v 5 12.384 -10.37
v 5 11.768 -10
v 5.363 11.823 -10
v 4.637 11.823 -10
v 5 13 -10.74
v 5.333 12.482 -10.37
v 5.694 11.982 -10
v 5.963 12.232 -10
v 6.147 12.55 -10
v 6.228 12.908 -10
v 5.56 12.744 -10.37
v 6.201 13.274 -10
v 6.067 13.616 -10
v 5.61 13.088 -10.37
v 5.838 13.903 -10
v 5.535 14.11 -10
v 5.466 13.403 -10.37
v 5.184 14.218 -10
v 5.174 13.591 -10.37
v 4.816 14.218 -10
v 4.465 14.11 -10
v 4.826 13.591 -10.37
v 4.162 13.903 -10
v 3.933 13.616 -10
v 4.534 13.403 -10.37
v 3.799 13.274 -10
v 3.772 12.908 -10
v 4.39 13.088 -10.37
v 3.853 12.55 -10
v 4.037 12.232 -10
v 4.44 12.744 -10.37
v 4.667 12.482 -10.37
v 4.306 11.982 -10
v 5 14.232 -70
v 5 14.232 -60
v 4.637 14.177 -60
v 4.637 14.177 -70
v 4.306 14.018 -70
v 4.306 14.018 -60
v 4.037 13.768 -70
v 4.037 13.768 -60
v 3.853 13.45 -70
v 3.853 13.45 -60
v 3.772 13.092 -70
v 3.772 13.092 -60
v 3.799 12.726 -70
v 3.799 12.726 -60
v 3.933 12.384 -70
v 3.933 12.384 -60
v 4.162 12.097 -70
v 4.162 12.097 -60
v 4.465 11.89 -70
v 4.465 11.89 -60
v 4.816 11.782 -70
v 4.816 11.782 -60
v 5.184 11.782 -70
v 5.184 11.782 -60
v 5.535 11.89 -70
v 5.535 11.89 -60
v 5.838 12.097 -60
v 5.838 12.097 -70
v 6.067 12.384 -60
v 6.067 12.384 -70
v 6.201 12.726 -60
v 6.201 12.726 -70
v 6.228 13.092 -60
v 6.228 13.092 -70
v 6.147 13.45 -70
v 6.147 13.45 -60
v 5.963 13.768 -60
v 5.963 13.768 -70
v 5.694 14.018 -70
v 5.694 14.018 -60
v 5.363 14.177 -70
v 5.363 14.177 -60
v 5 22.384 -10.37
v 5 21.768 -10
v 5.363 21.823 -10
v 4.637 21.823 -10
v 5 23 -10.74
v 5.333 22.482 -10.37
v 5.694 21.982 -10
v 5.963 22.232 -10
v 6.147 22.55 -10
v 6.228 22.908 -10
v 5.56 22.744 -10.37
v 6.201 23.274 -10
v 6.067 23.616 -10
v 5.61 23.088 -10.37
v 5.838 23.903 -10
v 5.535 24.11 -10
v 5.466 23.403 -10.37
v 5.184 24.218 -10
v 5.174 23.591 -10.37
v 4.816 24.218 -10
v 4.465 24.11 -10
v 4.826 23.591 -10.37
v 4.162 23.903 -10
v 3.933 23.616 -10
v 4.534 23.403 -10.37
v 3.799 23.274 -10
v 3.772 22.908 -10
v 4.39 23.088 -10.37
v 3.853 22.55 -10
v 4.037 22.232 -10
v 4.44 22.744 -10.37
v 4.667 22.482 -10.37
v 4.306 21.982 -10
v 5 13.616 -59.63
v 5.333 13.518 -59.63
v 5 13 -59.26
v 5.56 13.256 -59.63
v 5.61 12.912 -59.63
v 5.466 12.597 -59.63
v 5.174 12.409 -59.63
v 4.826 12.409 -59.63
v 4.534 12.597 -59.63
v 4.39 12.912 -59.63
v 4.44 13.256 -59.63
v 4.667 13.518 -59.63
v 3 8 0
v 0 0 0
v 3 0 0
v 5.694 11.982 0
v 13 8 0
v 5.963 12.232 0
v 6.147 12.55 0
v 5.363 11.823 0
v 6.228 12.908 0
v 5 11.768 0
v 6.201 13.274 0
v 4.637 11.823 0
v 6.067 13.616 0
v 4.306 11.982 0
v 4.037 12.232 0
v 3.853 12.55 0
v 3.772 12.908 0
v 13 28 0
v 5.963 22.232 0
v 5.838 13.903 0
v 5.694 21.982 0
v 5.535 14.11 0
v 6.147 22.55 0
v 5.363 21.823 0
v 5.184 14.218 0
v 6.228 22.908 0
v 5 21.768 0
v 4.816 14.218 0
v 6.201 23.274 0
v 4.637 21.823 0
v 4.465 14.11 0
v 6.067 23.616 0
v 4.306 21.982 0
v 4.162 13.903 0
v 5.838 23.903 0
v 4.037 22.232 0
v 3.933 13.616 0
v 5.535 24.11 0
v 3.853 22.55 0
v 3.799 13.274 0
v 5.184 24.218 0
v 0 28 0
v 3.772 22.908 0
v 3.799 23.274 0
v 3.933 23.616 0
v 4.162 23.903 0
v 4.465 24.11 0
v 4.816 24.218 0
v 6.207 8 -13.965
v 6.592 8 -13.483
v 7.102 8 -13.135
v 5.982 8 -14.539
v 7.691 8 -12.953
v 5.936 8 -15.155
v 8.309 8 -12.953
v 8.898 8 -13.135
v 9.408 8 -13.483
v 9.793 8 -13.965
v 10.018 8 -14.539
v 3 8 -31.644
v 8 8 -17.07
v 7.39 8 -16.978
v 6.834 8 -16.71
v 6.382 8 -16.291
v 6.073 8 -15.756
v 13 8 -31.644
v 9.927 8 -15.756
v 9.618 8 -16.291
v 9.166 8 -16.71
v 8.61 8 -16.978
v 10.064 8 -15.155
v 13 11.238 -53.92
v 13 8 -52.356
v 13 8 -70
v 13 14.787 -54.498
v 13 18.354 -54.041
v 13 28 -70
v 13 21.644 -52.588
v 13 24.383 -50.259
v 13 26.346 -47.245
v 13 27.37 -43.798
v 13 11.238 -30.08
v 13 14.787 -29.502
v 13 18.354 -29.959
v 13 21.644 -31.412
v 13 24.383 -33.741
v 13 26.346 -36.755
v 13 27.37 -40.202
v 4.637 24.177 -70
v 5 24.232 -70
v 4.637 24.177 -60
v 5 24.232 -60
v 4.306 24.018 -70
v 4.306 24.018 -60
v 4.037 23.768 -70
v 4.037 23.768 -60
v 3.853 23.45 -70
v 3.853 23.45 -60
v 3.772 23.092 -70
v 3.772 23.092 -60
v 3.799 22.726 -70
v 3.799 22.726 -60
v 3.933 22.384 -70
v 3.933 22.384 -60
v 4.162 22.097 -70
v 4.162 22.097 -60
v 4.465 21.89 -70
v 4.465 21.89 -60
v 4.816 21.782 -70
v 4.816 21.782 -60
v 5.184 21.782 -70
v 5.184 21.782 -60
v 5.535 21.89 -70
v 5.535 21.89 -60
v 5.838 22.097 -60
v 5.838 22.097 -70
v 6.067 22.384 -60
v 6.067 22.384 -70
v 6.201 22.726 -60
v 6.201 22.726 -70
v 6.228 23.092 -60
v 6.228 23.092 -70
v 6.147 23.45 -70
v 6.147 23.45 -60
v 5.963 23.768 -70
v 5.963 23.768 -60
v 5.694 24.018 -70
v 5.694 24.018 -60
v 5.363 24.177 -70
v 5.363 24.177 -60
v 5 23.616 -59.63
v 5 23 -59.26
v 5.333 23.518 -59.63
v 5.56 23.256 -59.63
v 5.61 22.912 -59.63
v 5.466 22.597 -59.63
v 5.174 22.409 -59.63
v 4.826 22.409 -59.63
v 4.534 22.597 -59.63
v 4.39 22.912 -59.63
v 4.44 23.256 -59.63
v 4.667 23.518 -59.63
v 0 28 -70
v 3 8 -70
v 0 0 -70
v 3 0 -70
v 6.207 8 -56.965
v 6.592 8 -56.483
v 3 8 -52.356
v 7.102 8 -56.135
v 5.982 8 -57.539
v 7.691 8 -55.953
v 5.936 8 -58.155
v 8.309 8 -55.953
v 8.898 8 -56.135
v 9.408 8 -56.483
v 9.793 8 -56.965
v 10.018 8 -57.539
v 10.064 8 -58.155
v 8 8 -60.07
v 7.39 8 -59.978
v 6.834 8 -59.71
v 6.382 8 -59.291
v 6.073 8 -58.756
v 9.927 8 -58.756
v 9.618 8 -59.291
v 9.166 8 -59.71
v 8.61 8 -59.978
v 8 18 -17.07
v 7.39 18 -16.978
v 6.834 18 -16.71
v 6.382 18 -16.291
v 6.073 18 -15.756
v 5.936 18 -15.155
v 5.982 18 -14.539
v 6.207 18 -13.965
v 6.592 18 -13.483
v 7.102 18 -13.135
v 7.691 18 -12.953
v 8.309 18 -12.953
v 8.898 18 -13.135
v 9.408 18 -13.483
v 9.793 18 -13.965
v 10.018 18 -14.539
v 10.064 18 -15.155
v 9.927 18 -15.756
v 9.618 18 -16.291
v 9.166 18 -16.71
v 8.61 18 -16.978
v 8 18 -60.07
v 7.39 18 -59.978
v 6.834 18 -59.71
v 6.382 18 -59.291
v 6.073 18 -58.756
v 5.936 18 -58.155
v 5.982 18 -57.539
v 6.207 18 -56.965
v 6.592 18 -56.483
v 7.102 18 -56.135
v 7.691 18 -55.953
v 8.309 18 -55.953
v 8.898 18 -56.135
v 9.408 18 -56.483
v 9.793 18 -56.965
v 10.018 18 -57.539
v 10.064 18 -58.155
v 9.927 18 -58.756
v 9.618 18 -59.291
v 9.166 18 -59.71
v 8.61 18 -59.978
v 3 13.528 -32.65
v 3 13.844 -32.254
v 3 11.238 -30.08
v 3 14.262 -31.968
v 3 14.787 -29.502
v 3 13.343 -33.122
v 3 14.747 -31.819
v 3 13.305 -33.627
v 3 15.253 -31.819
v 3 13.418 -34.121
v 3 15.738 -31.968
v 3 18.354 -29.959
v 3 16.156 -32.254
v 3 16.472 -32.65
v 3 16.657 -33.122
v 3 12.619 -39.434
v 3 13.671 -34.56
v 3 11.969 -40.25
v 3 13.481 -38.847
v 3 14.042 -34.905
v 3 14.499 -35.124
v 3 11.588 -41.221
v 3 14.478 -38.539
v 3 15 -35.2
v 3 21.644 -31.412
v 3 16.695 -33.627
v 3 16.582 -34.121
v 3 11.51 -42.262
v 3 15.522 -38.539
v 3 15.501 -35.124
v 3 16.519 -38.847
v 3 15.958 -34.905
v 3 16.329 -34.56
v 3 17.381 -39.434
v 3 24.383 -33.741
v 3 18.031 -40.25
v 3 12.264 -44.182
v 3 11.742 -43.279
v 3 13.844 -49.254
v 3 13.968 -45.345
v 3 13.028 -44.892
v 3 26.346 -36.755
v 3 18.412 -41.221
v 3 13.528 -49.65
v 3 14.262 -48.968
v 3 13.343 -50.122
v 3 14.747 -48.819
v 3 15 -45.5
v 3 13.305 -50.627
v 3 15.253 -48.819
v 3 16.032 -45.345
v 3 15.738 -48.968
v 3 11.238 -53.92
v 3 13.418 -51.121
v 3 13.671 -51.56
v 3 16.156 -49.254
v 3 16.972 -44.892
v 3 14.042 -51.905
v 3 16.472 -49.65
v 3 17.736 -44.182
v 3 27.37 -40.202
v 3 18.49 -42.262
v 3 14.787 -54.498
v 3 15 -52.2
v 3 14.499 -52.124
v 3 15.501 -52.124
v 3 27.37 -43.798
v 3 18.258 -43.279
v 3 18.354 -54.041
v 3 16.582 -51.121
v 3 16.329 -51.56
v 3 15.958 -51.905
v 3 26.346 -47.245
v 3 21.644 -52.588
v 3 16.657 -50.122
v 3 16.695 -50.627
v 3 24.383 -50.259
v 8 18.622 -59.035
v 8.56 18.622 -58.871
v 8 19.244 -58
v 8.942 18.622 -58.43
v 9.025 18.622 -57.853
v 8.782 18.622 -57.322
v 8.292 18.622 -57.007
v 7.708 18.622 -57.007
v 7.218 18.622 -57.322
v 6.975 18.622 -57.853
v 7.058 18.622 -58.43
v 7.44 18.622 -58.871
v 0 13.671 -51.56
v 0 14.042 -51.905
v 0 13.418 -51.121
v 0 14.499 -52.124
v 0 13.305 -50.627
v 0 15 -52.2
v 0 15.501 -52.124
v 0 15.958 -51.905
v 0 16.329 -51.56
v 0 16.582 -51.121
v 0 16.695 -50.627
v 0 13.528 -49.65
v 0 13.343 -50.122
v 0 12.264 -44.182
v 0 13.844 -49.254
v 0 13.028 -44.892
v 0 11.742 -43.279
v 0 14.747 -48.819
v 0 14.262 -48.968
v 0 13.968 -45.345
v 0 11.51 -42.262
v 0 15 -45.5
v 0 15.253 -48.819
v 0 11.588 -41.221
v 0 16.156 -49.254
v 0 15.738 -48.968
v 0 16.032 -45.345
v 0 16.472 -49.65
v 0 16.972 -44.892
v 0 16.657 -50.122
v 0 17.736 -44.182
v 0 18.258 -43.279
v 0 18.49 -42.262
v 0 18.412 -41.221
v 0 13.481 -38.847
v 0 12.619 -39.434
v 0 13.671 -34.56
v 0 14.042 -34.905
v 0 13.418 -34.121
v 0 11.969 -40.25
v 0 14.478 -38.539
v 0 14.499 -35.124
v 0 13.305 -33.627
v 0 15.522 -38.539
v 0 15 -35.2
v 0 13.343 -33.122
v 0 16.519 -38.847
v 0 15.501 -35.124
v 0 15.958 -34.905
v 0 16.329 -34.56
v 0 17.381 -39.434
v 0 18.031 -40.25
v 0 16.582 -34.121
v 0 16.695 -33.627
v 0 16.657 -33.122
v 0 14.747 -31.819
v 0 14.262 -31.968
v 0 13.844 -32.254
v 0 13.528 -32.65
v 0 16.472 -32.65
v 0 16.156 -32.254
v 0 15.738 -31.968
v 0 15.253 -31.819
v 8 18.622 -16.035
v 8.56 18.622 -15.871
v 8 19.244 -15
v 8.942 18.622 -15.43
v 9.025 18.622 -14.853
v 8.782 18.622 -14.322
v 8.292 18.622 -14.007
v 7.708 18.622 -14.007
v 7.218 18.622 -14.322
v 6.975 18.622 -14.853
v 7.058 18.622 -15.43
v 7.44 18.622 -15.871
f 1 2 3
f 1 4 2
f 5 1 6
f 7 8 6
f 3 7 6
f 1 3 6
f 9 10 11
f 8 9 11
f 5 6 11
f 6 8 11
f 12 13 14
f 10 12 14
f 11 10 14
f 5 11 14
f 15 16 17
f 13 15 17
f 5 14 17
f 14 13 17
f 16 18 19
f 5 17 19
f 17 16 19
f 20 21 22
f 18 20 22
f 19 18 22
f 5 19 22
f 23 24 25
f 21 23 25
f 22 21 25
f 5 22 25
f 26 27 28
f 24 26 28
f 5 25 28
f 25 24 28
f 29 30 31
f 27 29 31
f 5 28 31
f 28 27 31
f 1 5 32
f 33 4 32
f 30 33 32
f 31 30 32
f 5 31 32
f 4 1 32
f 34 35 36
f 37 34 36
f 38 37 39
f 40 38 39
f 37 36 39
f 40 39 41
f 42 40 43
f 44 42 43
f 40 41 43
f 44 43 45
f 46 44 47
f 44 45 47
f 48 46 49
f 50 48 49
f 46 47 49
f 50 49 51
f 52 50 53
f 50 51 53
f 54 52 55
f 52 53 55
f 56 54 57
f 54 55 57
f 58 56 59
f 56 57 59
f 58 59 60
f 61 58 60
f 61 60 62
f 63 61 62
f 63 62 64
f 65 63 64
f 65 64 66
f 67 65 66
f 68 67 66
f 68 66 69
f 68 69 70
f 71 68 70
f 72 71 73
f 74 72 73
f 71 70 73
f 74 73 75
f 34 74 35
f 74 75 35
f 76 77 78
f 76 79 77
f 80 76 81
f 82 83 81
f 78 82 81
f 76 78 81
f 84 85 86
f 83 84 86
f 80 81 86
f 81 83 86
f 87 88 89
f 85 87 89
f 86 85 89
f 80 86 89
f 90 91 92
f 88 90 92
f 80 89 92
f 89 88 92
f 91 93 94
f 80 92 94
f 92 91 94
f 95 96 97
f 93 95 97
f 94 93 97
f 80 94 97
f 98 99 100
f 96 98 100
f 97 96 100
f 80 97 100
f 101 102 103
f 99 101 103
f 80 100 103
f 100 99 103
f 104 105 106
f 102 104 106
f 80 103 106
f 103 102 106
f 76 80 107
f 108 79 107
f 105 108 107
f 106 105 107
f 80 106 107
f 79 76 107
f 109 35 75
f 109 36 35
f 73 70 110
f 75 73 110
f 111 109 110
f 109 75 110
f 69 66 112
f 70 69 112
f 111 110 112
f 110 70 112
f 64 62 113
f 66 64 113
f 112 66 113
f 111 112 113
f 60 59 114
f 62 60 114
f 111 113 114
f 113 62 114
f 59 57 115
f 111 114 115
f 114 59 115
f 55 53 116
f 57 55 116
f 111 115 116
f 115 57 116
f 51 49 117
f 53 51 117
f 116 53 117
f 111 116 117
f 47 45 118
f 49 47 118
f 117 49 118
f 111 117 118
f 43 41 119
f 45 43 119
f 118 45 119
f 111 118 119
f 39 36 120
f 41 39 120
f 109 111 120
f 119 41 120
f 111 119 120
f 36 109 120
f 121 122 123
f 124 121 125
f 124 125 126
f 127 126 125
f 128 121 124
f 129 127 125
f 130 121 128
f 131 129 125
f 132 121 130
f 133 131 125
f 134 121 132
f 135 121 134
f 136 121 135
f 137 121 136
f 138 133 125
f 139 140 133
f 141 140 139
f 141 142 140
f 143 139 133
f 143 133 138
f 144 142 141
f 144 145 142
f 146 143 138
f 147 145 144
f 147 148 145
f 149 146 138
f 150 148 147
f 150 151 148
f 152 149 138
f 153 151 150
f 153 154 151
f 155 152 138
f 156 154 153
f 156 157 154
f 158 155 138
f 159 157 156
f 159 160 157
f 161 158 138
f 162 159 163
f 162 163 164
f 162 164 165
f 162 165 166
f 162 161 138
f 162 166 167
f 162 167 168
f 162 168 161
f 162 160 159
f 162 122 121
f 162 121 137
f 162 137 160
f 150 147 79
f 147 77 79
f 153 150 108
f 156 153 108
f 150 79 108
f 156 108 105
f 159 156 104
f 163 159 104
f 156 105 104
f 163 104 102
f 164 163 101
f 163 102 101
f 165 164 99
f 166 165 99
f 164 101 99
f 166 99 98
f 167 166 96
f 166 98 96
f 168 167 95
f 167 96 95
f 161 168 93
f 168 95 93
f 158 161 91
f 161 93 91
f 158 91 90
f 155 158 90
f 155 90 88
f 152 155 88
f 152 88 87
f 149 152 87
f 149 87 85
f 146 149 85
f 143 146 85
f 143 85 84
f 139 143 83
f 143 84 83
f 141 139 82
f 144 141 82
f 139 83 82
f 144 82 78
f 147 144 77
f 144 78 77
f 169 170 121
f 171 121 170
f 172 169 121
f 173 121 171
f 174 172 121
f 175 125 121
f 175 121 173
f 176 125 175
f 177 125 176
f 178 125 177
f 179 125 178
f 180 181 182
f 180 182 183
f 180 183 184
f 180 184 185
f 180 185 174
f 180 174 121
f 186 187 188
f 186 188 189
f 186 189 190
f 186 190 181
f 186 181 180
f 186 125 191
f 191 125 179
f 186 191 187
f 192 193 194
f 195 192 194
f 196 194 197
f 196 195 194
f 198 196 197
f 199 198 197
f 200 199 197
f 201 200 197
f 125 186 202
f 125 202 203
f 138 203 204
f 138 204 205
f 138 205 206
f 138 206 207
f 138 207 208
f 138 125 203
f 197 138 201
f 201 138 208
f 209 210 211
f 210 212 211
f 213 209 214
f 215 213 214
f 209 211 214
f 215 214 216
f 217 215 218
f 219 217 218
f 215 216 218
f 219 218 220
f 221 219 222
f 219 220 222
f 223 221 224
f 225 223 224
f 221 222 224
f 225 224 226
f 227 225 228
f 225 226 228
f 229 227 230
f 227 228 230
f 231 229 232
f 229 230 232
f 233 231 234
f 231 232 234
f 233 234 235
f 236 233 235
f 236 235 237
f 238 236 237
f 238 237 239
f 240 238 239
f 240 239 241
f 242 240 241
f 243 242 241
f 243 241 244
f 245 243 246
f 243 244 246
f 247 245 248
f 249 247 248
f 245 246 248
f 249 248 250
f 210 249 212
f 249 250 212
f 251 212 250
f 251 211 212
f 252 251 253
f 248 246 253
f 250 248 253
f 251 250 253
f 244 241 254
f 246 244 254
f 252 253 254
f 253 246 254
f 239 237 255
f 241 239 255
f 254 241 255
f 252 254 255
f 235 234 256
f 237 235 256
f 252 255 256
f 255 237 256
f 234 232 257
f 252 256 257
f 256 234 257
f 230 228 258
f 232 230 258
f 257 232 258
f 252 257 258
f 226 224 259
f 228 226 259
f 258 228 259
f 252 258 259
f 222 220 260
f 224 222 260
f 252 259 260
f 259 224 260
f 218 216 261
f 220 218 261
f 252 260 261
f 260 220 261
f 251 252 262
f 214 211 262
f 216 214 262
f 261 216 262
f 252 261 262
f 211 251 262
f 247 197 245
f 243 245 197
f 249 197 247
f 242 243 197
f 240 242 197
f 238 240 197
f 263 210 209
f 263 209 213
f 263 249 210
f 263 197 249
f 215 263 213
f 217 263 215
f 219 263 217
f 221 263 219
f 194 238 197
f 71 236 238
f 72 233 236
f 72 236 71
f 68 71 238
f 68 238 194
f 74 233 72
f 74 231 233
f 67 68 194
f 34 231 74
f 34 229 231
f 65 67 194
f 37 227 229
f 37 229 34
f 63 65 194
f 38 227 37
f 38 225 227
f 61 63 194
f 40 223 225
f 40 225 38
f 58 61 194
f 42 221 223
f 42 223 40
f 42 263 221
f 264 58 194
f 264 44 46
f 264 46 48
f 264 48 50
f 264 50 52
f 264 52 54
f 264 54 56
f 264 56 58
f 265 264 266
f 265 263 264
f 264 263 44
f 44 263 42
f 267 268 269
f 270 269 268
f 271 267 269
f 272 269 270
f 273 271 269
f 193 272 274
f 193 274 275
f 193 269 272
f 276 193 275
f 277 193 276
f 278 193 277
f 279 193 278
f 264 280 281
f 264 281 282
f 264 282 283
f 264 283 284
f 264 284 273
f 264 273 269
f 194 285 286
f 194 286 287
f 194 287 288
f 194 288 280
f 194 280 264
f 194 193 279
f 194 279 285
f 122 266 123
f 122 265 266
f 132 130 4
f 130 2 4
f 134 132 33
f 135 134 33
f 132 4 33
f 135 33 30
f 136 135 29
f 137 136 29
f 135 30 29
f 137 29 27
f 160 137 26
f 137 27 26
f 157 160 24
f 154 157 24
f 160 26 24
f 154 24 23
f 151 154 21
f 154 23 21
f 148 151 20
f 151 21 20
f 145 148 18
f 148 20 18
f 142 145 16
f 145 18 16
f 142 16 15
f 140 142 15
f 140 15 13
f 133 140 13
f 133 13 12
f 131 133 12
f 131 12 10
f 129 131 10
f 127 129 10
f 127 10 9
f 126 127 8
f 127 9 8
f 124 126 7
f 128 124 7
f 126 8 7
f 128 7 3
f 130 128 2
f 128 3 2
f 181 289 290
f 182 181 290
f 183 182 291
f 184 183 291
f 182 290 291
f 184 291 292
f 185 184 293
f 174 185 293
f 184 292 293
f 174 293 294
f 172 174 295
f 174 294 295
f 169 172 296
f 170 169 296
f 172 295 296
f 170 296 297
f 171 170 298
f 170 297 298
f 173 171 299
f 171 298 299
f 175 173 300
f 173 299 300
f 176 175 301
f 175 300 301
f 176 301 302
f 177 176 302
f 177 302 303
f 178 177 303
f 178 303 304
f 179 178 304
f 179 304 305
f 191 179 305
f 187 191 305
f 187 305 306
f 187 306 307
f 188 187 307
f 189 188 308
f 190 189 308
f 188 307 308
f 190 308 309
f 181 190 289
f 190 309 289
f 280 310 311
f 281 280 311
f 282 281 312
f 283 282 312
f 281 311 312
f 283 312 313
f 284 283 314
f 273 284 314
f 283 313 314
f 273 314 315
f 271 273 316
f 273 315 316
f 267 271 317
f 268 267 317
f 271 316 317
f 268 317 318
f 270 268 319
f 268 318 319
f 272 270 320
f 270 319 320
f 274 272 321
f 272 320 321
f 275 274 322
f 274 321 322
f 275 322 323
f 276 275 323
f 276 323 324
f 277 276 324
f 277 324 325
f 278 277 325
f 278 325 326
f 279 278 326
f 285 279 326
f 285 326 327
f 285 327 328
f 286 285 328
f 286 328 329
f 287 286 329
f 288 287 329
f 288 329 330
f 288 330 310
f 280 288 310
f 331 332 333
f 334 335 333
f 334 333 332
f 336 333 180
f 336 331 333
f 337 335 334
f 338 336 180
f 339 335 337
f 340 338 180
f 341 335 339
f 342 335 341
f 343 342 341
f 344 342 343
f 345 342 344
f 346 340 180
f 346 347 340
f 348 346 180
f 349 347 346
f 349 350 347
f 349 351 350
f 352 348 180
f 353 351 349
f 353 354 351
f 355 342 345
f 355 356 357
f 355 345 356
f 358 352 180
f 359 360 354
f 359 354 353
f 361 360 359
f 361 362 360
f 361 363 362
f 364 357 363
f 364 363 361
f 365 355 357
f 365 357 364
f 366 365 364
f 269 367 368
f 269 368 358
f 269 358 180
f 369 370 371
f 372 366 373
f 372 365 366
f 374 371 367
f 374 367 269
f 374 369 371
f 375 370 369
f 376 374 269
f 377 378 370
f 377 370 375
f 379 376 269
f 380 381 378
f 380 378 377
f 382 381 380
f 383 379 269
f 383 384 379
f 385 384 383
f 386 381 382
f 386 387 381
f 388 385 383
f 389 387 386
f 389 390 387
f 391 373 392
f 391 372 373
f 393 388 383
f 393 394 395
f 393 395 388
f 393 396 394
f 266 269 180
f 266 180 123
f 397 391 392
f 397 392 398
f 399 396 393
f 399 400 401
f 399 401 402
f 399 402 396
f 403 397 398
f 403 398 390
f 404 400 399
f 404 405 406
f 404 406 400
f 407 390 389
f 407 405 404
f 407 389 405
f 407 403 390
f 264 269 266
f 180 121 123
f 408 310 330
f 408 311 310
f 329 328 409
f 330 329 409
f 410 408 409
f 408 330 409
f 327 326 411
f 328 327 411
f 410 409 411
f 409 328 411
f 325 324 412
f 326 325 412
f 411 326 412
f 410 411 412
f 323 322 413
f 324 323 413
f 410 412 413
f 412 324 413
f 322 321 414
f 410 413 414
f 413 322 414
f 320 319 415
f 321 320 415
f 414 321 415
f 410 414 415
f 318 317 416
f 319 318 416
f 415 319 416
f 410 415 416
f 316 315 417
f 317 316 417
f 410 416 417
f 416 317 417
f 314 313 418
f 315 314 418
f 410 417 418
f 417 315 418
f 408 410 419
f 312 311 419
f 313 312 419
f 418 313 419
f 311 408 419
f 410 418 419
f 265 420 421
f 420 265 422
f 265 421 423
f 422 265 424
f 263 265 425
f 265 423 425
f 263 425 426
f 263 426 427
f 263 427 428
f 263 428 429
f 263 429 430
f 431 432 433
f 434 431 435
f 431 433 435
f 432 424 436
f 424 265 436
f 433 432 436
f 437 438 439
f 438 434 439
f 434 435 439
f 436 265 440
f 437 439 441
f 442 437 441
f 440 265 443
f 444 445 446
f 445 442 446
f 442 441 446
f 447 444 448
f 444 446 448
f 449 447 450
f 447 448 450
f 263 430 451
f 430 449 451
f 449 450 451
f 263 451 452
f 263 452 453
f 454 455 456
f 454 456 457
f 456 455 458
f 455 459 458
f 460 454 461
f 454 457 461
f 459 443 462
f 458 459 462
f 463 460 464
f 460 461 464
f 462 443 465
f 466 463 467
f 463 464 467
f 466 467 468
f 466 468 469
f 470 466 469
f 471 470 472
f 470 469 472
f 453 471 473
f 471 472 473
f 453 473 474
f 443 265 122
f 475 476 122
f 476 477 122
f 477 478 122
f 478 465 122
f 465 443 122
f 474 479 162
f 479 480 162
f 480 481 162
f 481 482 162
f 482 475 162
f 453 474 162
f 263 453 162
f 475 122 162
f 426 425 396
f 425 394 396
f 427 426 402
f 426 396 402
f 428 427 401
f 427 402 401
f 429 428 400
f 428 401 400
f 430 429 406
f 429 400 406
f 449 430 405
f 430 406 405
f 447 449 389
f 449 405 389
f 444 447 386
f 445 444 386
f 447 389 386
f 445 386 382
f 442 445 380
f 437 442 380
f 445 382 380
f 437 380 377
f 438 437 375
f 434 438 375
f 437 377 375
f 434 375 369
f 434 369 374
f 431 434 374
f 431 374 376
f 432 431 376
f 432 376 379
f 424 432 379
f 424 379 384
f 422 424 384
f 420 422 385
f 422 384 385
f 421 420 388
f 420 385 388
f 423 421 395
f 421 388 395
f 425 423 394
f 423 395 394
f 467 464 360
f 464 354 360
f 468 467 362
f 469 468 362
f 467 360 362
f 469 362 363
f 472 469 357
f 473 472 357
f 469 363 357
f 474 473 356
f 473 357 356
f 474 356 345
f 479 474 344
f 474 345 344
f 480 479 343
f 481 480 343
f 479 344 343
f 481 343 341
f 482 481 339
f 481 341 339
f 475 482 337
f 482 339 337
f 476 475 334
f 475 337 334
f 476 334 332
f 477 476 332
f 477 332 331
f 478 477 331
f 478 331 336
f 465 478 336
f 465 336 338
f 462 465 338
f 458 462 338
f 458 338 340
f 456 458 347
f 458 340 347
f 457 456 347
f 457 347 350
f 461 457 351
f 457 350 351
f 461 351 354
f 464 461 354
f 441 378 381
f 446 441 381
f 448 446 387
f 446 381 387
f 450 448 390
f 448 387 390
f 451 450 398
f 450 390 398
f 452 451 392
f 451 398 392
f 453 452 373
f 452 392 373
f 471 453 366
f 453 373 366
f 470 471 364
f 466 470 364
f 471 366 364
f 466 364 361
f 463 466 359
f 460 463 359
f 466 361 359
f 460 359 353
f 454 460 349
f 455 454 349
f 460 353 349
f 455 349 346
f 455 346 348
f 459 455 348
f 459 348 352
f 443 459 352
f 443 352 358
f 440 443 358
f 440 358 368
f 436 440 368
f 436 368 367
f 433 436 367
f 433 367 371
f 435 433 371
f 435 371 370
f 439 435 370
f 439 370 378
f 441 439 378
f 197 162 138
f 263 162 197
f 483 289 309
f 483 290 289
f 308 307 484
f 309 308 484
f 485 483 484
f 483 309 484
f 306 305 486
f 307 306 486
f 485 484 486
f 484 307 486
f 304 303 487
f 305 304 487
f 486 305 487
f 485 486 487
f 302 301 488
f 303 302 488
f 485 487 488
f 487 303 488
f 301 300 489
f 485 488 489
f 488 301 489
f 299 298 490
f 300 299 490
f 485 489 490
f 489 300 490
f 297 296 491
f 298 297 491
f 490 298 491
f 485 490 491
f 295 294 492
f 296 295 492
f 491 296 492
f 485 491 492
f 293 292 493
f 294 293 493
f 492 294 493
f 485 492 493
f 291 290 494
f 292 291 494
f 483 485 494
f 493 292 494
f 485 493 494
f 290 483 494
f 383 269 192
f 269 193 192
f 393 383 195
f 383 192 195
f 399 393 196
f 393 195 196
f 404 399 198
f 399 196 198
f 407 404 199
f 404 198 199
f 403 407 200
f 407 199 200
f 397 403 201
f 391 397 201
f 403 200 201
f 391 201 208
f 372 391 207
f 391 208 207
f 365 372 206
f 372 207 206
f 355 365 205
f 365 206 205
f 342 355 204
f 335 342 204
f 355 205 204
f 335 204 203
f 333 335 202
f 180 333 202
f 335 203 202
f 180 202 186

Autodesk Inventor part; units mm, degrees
ref_plane "YZ Plane" through (0, 0, 0) normal (1, 0, 0) x (0, 1, 0)
ref_plane "XZ Plane" through (0, 0, 0) normal (0, 1, 0) x (-1, 0, 0)
ref_plane "XY Plane" through (0, 0, 0) normal (0, 0, 1) x (1, 0, 0)
sketch "Sketch1" plane through (0, 0, 0) normal (1, 0, 0) x (0, 1, 0)
  line L0 (0, 0) -> (28, 0)
  line L1 (28, 0) -> (28, -70)
  line L2 (28, -70) -> (0, -70)
  line L3 (0, -70) -> (0, 0)
  dimension "d20" = 70
extrude "Extrusion1" add sketch "Sketch1" along normal blind 13
sketch "Sketch2" plane through (13, 0, 0) normal (1, 0, 0) x (0, 0, -1)
  line L0 (0, 8) -> (0, 0)
  line L1 (0, 28) -> (0, 0) projected
  line L2 (0, 0) -> (70, 0) projected
  line L3 (0, 0) -> (70, 0)
  line L4 (70, 0) -> (70, 8)
  line L5 (70, 0) -> (70, 28) projected
  line L6 (0, 8) -> (70, 8)
extrude "Extrusion2" cut sketch "Sketch2" against normal blind 10
sketch "Sketch3" plane through (13, 0, 0) normal (1, 0, 0) x (0, 0, -1)
  line L0 (70, 0) -> (0, 0) projected
  line L1 (70, 0) -> (42, 0)
  line L2 (42, 0) -> (42, 15)
  circle A0 centre (42, 15) radius 12.5
  dimension "d21" = 28
  dimension "d22" = 15
  dimension "d23" = 25
extrude "Extrusion3" cut sketch "Sketch3" against normal blind 10
sketch "Sketch4" plane through (3, 0, 0) normal (1, 0, 0) x (0, 0, -1)
  arc A0 (52.3562, 8) -> (31.6438, 8) centre (42, 15) ccw projected
  circle A1 centre (42, 15) radius 3.5
  line L0 (42, 15) -> (50.5, 15)
  line L1 (42, 15) -> (33.5, 15)
  circle A2 centre (33.5, 15) radius 1.7
  circle A3 centre (50.5, 15) radius 1.7
  point P0 (0, 0)
  dimension "d24" = 7
  dimension "d25" = 8.5
  dimension "d26" = 8.5
  dimension "d68" = 3.4
  dimension "d69" = 3.4
extrude "Extrusion4" cut sketch "Sketch4" against normal blind 3
sketch "Sketch5" plane through (0, 0, -70) normal (0, 0, -1) x (-1, 0, 0)
  line L0 (0, 28) -> (-13, 28) projected
  line L1 (0, 28) -> (-5, 28)
  line L2 (-5, 28) -> (-5, 23)
  line L3 (-5, 23) -> (0, 23)
  line L4 (0, 23) -> (0, 28)
  line L5 (0, 8) -> (-5, 8)
  line L6 (-5, 8) -> (-5, 13)
  line L7 (-5, 13) -> (0, 13)
  line L8 (0, 13) -> (0, 8)
  point P0 (0, 0)
  dimension "d29" = 5
  dimension "d30" = 5
  dimension "d31" = 5
  dimension "d32" = 5
hole "Hole1" at (5, 13, -70) at (5, 23, -70) direction (0, 0, 1) diameter 2.4638 depth 10 tip angle 118
sketch "Sketch6" plane through (0, 0, 0) normal (0, 0, 1) x (1, 0, 0)
  line L0 (0, 28) -> (13, 28) projected
  circle A0 centre (5, 23) radius 1.2319 projected
  line L1 (0, 28) -> (5, 28)
  line L2 (5, 28) -> (5, 23)
  line L3 (5, 23) -> (0, 23)
  line L4 (0, 23) -> (0, 28)
  circle A1 centre (5, 13) radius 1.2319 projected
  line L5 (0, 8) -> (5, 8)
  line L6 (5, 8) -> (5, 13)
  line L7 (5, 13) -> (0, 13)
  line L8 (0, 13) -> (0, 8)
  point P0 (0, 0)
  point P1 (3.8741, 22.5)
  point P2 (6.1259, 22.5)
hole "Hole2" at (5, 23, 0) at (5, 13, 0) direction (0, 0, -1) diameter 2.4638 depth 10 tip angle 118
sketch "Sketch9" plane through (3, 8, 0) normal (0, -1, 0) x (1, 0, 0)
  line L0 (-3, 0) -> (10, 0) projected
  line L1 (10, 0) -> (5, 0)
  line L2 (5, 0) -> (5, -15)
  line L3 (5, -15) -> (10, -15)
  line L4 (10, -15) -> (10, 0)
  line L5 (10, -70) -> (10, 0) projected
  line L6 (10, -70) -> (5, -70)
  line L7 (5, -70) -> (5, -58)
  line L8 (5, -58) -> (10, -58)
  line L9 (10, -58) -> (10, -70)
  dimension "d70" = 5
  dimension "d71" = 15
  dimension "d74" = 5
  dimension "d75" = 12
hole "Hole4" at (8, 8, -15) at (8, 8, -58) direction (0, 1, 0) diameter 4.1402 depth 10 tip angle 118
properties part number "mocowanie silnika"
